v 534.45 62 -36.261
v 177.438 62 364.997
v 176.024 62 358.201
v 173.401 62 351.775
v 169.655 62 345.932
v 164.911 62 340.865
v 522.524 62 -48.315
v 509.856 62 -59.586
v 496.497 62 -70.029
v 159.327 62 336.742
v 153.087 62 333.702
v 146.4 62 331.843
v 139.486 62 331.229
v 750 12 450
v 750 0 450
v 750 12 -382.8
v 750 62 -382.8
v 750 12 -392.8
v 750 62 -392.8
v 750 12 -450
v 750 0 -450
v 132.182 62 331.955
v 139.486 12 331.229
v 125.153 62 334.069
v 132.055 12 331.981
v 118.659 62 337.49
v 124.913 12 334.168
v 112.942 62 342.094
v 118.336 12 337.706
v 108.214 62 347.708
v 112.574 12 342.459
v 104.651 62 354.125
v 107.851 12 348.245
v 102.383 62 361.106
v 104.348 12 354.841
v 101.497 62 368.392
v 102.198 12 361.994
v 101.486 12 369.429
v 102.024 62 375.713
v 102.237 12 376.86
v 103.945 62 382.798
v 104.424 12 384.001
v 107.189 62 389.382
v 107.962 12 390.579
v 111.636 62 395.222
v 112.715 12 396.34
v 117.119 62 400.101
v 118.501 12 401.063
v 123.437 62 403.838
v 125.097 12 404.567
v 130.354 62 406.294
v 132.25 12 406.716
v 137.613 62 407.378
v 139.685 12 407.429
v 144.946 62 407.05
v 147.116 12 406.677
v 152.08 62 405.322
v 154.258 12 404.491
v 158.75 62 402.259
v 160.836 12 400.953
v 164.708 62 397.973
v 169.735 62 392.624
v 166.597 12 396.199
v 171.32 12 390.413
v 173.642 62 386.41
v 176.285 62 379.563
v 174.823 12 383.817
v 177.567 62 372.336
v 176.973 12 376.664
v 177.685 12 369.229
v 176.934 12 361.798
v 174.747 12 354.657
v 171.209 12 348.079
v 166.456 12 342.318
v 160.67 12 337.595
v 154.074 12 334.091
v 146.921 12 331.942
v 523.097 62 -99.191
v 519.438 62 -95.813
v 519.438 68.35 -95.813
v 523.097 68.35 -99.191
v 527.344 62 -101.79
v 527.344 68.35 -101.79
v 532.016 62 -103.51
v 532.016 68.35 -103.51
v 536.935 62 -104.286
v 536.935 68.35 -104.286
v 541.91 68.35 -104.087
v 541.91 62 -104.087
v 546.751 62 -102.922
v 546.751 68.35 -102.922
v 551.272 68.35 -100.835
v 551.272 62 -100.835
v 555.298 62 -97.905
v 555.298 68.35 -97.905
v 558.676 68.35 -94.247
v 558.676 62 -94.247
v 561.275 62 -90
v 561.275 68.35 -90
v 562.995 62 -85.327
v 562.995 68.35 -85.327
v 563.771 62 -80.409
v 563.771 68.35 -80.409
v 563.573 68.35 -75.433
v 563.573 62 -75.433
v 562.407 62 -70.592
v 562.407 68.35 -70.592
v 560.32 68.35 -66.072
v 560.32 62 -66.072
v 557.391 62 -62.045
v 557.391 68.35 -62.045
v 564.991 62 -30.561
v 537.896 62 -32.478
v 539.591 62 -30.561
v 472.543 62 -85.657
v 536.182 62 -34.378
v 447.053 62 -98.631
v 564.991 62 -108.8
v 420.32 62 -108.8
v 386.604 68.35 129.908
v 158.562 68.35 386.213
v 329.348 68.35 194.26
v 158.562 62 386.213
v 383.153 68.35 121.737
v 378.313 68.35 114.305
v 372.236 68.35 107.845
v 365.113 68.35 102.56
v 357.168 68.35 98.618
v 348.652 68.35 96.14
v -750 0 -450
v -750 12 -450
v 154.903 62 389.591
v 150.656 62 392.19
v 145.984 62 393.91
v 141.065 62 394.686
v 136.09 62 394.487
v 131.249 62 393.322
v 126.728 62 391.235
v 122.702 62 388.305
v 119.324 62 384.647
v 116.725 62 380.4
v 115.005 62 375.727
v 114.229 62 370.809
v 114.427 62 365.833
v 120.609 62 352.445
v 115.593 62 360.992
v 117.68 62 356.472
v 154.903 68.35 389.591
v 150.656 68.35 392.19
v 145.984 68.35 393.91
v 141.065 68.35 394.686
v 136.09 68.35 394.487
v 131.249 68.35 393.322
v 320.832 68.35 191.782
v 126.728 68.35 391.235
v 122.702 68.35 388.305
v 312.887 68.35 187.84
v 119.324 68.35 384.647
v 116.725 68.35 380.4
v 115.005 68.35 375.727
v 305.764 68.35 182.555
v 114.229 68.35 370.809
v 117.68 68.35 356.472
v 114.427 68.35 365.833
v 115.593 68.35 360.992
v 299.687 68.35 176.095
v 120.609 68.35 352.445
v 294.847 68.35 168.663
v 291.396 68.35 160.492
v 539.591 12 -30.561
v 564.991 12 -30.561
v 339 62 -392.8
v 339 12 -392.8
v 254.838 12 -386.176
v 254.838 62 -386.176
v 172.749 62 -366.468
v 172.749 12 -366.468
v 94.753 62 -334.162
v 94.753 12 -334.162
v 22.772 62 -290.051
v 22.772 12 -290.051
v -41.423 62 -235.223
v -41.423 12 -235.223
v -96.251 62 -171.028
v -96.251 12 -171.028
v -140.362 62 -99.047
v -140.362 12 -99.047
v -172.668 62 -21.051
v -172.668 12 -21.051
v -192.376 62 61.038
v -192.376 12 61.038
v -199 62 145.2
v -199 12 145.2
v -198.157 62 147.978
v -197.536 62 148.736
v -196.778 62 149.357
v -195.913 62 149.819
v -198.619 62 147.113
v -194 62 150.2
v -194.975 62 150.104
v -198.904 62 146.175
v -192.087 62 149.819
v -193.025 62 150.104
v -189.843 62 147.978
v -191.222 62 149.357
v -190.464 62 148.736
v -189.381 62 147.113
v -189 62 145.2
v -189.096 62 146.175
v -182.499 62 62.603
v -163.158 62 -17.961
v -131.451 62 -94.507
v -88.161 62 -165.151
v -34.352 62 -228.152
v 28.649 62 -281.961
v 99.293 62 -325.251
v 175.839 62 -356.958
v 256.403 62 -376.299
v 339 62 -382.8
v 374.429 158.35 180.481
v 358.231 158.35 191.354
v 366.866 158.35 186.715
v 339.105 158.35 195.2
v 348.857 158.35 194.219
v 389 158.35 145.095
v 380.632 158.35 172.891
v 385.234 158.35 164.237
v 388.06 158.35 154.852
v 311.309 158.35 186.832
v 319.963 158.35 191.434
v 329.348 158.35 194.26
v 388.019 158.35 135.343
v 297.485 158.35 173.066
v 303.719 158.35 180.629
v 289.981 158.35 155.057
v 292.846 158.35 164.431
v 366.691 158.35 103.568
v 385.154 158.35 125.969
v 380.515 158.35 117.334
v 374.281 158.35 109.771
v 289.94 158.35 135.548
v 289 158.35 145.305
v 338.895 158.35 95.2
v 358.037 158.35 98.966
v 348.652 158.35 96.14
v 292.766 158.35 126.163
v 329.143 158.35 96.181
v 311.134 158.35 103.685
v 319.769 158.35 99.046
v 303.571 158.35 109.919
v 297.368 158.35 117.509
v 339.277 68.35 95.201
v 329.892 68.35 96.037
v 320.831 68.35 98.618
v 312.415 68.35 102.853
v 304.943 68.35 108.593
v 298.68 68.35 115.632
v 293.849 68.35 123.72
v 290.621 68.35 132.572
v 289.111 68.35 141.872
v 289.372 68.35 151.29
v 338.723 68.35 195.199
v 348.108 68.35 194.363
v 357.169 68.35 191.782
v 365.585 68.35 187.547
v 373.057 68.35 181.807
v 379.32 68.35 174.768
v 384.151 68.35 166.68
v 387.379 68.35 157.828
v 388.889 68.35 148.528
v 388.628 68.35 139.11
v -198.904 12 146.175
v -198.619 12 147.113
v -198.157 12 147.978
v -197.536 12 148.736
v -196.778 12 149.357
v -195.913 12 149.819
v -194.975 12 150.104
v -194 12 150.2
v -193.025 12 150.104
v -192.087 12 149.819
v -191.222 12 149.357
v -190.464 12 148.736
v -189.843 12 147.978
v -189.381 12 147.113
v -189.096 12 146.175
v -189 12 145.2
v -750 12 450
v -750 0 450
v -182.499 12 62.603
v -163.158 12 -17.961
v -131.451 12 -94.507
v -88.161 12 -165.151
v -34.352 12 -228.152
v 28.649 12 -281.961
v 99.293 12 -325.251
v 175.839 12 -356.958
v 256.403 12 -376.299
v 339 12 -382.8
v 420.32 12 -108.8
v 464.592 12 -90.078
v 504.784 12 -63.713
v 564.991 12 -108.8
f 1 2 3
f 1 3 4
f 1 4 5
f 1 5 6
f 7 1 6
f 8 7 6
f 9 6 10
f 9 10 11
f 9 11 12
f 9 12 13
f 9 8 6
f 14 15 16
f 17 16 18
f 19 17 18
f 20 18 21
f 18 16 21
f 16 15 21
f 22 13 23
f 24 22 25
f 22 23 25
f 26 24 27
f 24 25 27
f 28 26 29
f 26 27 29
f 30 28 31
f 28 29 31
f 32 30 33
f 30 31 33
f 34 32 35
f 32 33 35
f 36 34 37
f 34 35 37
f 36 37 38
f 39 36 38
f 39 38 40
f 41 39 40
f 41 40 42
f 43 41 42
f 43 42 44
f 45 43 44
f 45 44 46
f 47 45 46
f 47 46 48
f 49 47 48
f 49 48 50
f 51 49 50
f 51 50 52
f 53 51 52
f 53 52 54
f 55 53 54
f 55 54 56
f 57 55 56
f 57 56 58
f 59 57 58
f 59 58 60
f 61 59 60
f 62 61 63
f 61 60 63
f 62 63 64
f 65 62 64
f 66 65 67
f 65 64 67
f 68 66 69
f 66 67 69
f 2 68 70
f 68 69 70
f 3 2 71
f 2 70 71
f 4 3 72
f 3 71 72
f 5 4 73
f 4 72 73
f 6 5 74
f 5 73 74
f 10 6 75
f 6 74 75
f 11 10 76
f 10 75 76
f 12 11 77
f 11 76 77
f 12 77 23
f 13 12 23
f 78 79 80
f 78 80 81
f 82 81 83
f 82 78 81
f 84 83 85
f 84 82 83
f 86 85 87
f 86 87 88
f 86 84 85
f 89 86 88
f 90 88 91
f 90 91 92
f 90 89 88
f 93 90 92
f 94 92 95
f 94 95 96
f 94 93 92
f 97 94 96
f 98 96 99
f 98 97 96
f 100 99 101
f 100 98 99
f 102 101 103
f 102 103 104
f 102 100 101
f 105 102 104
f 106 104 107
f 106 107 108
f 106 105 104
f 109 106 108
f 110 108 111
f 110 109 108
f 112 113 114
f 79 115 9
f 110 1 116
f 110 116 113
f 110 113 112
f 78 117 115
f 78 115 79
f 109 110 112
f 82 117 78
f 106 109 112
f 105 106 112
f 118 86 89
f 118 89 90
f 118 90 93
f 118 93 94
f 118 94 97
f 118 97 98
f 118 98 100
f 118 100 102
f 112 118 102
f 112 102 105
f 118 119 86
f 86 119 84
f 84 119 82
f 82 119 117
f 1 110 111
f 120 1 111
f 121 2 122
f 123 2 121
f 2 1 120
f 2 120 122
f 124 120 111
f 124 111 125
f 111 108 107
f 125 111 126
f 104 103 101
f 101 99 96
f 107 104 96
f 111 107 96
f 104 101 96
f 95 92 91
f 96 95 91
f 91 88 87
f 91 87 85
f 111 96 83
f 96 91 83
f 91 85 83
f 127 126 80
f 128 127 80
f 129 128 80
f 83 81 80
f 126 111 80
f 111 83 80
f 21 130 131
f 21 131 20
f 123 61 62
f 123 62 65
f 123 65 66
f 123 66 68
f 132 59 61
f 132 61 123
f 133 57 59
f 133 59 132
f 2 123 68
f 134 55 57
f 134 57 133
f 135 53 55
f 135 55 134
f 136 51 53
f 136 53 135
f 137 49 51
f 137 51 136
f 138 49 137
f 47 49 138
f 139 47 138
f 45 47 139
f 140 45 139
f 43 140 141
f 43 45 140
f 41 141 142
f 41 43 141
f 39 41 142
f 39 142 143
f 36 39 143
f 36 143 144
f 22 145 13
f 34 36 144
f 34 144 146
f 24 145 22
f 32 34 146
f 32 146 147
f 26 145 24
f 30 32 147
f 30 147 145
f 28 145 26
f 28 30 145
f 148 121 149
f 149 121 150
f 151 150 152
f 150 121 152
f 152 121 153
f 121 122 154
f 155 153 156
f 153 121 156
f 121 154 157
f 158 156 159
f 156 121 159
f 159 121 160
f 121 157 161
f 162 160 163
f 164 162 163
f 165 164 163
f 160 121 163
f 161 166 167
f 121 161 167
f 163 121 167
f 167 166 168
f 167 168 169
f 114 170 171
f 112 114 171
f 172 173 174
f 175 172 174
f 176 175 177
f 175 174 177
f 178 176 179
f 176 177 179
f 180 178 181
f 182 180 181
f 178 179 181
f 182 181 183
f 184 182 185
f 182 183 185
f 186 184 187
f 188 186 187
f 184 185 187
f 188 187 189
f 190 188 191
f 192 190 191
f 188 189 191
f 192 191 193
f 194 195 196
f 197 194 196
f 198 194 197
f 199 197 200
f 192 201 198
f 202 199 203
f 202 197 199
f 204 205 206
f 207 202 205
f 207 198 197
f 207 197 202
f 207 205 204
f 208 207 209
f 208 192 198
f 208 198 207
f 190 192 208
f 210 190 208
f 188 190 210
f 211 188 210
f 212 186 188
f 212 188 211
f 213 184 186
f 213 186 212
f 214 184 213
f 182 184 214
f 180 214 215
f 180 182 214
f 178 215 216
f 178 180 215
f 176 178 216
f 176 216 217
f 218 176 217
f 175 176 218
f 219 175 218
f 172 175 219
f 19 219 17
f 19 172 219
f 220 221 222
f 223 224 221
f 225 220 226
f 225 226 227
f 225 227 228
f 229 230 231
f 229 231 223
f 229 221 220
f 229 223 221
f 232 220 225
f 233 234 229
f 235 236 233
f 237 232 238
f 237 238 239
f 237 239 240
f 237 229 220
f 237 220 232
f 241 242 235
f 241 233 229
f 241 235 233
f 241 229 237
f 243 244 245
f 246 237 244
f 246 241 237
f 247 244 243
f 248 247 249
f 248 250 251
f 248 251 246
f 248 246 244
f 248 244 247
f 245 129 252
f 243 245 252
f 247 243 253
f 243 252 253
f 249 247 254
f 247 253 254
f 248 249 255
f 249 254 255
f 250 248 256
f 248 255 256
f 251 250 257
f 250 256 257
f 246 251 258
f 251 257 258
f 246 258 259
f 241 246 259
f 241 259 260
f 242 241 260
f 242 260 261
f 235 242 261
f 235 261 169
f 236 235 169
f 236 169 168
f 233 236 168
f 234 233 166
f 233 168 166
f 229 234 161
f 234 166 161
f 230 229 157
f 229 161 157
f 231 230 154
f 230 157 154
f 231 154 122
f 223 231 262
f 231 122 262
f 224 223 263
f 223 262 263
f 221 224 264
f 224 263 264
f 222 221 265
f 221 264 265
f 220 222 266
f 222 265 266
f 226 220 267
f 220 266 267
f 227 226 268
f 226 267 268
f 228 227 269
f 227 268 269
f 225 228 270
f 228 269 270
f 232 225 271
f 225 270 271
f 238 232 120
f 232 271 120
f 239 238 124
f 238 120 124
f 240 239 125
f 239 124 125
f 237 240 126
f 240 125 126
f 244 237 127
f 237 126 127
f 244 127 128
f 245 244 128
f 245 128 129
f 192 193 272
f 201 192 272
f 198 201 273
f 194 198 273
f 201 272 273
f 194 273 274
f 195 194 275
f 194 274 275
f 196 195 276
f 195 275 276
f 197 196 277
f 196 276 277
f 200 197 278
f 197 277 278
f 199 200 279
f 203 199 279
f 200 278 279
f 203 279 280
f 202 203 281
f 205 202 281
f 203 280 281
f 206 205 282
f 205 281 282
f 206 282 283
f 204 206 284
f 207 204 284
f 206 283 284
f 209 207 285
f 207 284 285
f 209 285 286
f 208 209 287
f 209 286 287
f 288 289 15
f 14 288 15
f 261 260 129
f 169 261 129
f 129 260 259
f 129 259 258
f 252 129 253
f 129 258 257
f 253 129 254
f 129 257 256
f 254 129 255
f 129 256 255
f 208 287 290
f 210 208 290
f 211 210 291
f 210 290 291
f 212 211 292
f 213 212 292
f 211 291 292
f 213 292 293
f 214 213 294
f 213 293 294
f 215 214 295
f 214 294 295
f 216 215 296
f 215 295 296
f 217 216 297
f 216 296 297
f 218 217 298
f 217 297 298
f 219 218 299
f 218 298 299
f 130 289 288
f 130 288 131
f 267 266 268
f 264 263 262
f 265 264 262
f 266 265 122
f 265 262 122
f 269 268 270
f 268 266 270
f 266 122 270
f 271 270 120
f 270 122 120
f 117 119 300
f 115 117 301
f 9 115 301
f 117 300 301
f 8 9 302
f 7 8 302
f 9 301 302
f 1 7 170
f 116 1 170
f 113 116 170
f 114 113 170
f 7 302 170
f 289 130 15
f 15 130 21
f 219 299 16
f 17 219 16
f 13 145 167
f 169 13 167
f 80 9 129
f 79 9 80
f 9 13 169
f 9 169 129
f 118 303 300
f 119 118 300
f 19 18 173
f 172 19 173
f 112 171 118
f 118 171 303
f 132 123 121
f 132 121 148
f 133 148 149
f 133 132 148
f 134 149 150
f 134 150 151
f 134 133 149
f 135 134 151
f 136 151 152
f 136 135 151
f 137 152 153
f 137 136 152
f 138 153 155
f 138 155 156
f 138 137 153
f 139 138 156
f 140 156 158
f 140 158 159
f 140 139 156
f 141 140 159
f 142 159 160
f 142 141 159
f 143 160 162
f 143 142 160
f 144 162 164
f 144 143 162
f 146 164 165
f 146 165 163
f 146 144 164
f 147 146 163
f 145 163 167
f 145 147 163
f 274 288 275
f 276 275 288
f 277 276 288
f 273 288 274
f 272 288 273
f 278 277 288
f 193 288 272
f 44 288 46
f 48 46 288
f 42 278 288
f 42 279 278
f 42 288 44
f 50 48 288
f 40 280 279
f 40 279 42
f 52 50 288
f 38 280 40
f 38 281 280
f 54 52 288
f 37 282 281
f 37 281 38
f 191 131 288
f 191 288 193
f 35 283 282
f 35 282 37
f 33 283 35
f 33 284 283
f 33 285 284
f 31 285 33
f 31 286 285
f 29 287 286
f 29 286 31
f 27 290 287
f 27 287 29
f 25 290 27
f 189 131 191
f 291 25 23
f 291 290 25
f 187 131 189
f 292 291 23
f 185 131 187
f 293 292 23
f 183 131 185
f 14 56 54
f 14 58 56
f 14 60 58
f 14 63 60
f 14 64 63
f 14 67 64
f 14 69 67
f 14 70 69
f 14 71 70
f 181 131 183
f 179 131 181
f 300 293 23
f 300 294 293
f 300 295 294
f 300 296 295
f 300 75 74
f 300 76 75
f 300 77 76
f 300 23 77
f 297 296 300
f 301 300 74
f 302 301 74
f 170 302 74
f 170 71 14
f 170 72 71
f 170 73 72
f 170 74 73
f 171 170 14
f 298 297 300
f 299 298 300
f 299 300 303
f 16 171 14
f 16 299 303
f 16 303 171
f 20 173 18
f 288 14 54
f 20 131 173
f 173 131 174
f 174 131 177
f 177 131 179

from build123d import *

# Parameters (mm, degrees)
SKETCH1_W           = 1500
SKETCH1_H           = 900
BOSS_EXTRUDE1_DEPTH = 12
BOSS_EXTRUDE2_DEPTH = 50
BOSS_EXTRUDE3_DEPTH = 50
BOSS_EXTRUDE4_DEPTH = 6.35
SKETCH5_R           = 38.1
BOSS_EXTRUDE5_DEPTH = 50
SKETCH6_R           = 50
BOSS_EXTRUDE6_DEPTH = 90


with BuildPart() as part:
    # Sketch1 → Boss-Extrude1 (new body)
    with BuildSketch(Plane(origin=(0, 0, 0), x_dir=(1, 0, 0), z_dir=(0, 1, 0))):
        Rectangle(SKETCH1_W, SKETCH1_H)
    extrude(amount=BOSS_EXTRUDE1_DEPTH)

    # Sketch2 → Boss-Extrude2 (add)
    with BuildSketch(Plane(origin=(0, 12, 0), x_dir=(1, 0, 0), z_dir=(0, 1, 0))):
        with BuildLine():
            Line((339, 382.8), (750, 382.8))
            Line((750, 382.8), (750, 392.8))
            Line((750, 392.8), (339, 392.8))
            ThreePointArc((339, 392.8), (-41.423448278, 235.223448278), (-199, -145.2))
            ThreePointArc((-199, -145.2), (-194, -150.2), (-189, -145.2))
            ThreePointArc((-189, -145.2), (-34.352380466, 228.152380466), (339, 382.8))
        make_face()
    extrude(amount=BOSS_EXTRUDE2_DEPTH)

    # Sketch3 → Boss-Extrude3 (add)
    with BuildSketch(Plane(origin=(0, 12, 0), x_dir=(1, 0, 0), z_dir=(0, 1, 0))):
        with BuildLine():
            Line((564.991489323, 108.8), (420.319677815, 108.8))
            ThreePointArc((420.319677815, 108.8), (485.283321394, 77.802421247), (539.591489323, 30.561043498))
            Line((539.591489323, 30.561043498), (564.991489323, 30.561043498))
            Line((564.991489323, 30.561043498), (564.991489323, 108.8))
        make_face()
    extrude(amount=BOSS_EXTRUDE3_DEPTH)

    # Sketch4 → Boss-Extrude4 (add)
    with BuildSketch(Plane(origin=(0, 62, 0), x_dir=(1, 0, 0), z_dir=(0, 1, 0))):
        with BuildLine():
            Line((120.609259907, -352.445373029), (519.438207109, 95.812890558))
            ThreePointArc((519.438207109, 95.812890558), (555.298232366, 97.905398285), (557.390740093, 62.045373029))
            Line((557.390740093, 62.045373029), (158.561792891, -386.212890558))
            ThreePointArc((158.561792891, -386.212890558), (122.701767634, -388.305398285), (120.609259907, -352.445373029))
        make_face()
    extrude(amount=BOSS_EXTRUDE4_DEPTH)

    # Sketch5 → Boss-Extrude5 (add)
    with BuildSketch(Plane(origin=(0, 12, 0), x_dir=(1, 0, 0), z_dir=(0, 1, 0))):
        with Locations(Location((139.585526399, -369.329131794, 0), (0, 0, 90.149856959))):
            Circle(SKETCH5_R)
    extrude(amount=BOSS_EXTRUDE5_DEPTH)

    # Sketch6 → Boss-Extrude6 (add)
    with BuildSketch(Plane(origin=(0, 68.35, 0), x_dir=(1, 0, 0), z_dir=(0, 1, 0))):
        with Locations(Location((339, -145.2, 0), (0, 0, 78.870244402))):
            Circle(SKETCH6_R)
    extrude(amount=BOSS_EXTRUDE6_DEPTH)


solid = part.part
